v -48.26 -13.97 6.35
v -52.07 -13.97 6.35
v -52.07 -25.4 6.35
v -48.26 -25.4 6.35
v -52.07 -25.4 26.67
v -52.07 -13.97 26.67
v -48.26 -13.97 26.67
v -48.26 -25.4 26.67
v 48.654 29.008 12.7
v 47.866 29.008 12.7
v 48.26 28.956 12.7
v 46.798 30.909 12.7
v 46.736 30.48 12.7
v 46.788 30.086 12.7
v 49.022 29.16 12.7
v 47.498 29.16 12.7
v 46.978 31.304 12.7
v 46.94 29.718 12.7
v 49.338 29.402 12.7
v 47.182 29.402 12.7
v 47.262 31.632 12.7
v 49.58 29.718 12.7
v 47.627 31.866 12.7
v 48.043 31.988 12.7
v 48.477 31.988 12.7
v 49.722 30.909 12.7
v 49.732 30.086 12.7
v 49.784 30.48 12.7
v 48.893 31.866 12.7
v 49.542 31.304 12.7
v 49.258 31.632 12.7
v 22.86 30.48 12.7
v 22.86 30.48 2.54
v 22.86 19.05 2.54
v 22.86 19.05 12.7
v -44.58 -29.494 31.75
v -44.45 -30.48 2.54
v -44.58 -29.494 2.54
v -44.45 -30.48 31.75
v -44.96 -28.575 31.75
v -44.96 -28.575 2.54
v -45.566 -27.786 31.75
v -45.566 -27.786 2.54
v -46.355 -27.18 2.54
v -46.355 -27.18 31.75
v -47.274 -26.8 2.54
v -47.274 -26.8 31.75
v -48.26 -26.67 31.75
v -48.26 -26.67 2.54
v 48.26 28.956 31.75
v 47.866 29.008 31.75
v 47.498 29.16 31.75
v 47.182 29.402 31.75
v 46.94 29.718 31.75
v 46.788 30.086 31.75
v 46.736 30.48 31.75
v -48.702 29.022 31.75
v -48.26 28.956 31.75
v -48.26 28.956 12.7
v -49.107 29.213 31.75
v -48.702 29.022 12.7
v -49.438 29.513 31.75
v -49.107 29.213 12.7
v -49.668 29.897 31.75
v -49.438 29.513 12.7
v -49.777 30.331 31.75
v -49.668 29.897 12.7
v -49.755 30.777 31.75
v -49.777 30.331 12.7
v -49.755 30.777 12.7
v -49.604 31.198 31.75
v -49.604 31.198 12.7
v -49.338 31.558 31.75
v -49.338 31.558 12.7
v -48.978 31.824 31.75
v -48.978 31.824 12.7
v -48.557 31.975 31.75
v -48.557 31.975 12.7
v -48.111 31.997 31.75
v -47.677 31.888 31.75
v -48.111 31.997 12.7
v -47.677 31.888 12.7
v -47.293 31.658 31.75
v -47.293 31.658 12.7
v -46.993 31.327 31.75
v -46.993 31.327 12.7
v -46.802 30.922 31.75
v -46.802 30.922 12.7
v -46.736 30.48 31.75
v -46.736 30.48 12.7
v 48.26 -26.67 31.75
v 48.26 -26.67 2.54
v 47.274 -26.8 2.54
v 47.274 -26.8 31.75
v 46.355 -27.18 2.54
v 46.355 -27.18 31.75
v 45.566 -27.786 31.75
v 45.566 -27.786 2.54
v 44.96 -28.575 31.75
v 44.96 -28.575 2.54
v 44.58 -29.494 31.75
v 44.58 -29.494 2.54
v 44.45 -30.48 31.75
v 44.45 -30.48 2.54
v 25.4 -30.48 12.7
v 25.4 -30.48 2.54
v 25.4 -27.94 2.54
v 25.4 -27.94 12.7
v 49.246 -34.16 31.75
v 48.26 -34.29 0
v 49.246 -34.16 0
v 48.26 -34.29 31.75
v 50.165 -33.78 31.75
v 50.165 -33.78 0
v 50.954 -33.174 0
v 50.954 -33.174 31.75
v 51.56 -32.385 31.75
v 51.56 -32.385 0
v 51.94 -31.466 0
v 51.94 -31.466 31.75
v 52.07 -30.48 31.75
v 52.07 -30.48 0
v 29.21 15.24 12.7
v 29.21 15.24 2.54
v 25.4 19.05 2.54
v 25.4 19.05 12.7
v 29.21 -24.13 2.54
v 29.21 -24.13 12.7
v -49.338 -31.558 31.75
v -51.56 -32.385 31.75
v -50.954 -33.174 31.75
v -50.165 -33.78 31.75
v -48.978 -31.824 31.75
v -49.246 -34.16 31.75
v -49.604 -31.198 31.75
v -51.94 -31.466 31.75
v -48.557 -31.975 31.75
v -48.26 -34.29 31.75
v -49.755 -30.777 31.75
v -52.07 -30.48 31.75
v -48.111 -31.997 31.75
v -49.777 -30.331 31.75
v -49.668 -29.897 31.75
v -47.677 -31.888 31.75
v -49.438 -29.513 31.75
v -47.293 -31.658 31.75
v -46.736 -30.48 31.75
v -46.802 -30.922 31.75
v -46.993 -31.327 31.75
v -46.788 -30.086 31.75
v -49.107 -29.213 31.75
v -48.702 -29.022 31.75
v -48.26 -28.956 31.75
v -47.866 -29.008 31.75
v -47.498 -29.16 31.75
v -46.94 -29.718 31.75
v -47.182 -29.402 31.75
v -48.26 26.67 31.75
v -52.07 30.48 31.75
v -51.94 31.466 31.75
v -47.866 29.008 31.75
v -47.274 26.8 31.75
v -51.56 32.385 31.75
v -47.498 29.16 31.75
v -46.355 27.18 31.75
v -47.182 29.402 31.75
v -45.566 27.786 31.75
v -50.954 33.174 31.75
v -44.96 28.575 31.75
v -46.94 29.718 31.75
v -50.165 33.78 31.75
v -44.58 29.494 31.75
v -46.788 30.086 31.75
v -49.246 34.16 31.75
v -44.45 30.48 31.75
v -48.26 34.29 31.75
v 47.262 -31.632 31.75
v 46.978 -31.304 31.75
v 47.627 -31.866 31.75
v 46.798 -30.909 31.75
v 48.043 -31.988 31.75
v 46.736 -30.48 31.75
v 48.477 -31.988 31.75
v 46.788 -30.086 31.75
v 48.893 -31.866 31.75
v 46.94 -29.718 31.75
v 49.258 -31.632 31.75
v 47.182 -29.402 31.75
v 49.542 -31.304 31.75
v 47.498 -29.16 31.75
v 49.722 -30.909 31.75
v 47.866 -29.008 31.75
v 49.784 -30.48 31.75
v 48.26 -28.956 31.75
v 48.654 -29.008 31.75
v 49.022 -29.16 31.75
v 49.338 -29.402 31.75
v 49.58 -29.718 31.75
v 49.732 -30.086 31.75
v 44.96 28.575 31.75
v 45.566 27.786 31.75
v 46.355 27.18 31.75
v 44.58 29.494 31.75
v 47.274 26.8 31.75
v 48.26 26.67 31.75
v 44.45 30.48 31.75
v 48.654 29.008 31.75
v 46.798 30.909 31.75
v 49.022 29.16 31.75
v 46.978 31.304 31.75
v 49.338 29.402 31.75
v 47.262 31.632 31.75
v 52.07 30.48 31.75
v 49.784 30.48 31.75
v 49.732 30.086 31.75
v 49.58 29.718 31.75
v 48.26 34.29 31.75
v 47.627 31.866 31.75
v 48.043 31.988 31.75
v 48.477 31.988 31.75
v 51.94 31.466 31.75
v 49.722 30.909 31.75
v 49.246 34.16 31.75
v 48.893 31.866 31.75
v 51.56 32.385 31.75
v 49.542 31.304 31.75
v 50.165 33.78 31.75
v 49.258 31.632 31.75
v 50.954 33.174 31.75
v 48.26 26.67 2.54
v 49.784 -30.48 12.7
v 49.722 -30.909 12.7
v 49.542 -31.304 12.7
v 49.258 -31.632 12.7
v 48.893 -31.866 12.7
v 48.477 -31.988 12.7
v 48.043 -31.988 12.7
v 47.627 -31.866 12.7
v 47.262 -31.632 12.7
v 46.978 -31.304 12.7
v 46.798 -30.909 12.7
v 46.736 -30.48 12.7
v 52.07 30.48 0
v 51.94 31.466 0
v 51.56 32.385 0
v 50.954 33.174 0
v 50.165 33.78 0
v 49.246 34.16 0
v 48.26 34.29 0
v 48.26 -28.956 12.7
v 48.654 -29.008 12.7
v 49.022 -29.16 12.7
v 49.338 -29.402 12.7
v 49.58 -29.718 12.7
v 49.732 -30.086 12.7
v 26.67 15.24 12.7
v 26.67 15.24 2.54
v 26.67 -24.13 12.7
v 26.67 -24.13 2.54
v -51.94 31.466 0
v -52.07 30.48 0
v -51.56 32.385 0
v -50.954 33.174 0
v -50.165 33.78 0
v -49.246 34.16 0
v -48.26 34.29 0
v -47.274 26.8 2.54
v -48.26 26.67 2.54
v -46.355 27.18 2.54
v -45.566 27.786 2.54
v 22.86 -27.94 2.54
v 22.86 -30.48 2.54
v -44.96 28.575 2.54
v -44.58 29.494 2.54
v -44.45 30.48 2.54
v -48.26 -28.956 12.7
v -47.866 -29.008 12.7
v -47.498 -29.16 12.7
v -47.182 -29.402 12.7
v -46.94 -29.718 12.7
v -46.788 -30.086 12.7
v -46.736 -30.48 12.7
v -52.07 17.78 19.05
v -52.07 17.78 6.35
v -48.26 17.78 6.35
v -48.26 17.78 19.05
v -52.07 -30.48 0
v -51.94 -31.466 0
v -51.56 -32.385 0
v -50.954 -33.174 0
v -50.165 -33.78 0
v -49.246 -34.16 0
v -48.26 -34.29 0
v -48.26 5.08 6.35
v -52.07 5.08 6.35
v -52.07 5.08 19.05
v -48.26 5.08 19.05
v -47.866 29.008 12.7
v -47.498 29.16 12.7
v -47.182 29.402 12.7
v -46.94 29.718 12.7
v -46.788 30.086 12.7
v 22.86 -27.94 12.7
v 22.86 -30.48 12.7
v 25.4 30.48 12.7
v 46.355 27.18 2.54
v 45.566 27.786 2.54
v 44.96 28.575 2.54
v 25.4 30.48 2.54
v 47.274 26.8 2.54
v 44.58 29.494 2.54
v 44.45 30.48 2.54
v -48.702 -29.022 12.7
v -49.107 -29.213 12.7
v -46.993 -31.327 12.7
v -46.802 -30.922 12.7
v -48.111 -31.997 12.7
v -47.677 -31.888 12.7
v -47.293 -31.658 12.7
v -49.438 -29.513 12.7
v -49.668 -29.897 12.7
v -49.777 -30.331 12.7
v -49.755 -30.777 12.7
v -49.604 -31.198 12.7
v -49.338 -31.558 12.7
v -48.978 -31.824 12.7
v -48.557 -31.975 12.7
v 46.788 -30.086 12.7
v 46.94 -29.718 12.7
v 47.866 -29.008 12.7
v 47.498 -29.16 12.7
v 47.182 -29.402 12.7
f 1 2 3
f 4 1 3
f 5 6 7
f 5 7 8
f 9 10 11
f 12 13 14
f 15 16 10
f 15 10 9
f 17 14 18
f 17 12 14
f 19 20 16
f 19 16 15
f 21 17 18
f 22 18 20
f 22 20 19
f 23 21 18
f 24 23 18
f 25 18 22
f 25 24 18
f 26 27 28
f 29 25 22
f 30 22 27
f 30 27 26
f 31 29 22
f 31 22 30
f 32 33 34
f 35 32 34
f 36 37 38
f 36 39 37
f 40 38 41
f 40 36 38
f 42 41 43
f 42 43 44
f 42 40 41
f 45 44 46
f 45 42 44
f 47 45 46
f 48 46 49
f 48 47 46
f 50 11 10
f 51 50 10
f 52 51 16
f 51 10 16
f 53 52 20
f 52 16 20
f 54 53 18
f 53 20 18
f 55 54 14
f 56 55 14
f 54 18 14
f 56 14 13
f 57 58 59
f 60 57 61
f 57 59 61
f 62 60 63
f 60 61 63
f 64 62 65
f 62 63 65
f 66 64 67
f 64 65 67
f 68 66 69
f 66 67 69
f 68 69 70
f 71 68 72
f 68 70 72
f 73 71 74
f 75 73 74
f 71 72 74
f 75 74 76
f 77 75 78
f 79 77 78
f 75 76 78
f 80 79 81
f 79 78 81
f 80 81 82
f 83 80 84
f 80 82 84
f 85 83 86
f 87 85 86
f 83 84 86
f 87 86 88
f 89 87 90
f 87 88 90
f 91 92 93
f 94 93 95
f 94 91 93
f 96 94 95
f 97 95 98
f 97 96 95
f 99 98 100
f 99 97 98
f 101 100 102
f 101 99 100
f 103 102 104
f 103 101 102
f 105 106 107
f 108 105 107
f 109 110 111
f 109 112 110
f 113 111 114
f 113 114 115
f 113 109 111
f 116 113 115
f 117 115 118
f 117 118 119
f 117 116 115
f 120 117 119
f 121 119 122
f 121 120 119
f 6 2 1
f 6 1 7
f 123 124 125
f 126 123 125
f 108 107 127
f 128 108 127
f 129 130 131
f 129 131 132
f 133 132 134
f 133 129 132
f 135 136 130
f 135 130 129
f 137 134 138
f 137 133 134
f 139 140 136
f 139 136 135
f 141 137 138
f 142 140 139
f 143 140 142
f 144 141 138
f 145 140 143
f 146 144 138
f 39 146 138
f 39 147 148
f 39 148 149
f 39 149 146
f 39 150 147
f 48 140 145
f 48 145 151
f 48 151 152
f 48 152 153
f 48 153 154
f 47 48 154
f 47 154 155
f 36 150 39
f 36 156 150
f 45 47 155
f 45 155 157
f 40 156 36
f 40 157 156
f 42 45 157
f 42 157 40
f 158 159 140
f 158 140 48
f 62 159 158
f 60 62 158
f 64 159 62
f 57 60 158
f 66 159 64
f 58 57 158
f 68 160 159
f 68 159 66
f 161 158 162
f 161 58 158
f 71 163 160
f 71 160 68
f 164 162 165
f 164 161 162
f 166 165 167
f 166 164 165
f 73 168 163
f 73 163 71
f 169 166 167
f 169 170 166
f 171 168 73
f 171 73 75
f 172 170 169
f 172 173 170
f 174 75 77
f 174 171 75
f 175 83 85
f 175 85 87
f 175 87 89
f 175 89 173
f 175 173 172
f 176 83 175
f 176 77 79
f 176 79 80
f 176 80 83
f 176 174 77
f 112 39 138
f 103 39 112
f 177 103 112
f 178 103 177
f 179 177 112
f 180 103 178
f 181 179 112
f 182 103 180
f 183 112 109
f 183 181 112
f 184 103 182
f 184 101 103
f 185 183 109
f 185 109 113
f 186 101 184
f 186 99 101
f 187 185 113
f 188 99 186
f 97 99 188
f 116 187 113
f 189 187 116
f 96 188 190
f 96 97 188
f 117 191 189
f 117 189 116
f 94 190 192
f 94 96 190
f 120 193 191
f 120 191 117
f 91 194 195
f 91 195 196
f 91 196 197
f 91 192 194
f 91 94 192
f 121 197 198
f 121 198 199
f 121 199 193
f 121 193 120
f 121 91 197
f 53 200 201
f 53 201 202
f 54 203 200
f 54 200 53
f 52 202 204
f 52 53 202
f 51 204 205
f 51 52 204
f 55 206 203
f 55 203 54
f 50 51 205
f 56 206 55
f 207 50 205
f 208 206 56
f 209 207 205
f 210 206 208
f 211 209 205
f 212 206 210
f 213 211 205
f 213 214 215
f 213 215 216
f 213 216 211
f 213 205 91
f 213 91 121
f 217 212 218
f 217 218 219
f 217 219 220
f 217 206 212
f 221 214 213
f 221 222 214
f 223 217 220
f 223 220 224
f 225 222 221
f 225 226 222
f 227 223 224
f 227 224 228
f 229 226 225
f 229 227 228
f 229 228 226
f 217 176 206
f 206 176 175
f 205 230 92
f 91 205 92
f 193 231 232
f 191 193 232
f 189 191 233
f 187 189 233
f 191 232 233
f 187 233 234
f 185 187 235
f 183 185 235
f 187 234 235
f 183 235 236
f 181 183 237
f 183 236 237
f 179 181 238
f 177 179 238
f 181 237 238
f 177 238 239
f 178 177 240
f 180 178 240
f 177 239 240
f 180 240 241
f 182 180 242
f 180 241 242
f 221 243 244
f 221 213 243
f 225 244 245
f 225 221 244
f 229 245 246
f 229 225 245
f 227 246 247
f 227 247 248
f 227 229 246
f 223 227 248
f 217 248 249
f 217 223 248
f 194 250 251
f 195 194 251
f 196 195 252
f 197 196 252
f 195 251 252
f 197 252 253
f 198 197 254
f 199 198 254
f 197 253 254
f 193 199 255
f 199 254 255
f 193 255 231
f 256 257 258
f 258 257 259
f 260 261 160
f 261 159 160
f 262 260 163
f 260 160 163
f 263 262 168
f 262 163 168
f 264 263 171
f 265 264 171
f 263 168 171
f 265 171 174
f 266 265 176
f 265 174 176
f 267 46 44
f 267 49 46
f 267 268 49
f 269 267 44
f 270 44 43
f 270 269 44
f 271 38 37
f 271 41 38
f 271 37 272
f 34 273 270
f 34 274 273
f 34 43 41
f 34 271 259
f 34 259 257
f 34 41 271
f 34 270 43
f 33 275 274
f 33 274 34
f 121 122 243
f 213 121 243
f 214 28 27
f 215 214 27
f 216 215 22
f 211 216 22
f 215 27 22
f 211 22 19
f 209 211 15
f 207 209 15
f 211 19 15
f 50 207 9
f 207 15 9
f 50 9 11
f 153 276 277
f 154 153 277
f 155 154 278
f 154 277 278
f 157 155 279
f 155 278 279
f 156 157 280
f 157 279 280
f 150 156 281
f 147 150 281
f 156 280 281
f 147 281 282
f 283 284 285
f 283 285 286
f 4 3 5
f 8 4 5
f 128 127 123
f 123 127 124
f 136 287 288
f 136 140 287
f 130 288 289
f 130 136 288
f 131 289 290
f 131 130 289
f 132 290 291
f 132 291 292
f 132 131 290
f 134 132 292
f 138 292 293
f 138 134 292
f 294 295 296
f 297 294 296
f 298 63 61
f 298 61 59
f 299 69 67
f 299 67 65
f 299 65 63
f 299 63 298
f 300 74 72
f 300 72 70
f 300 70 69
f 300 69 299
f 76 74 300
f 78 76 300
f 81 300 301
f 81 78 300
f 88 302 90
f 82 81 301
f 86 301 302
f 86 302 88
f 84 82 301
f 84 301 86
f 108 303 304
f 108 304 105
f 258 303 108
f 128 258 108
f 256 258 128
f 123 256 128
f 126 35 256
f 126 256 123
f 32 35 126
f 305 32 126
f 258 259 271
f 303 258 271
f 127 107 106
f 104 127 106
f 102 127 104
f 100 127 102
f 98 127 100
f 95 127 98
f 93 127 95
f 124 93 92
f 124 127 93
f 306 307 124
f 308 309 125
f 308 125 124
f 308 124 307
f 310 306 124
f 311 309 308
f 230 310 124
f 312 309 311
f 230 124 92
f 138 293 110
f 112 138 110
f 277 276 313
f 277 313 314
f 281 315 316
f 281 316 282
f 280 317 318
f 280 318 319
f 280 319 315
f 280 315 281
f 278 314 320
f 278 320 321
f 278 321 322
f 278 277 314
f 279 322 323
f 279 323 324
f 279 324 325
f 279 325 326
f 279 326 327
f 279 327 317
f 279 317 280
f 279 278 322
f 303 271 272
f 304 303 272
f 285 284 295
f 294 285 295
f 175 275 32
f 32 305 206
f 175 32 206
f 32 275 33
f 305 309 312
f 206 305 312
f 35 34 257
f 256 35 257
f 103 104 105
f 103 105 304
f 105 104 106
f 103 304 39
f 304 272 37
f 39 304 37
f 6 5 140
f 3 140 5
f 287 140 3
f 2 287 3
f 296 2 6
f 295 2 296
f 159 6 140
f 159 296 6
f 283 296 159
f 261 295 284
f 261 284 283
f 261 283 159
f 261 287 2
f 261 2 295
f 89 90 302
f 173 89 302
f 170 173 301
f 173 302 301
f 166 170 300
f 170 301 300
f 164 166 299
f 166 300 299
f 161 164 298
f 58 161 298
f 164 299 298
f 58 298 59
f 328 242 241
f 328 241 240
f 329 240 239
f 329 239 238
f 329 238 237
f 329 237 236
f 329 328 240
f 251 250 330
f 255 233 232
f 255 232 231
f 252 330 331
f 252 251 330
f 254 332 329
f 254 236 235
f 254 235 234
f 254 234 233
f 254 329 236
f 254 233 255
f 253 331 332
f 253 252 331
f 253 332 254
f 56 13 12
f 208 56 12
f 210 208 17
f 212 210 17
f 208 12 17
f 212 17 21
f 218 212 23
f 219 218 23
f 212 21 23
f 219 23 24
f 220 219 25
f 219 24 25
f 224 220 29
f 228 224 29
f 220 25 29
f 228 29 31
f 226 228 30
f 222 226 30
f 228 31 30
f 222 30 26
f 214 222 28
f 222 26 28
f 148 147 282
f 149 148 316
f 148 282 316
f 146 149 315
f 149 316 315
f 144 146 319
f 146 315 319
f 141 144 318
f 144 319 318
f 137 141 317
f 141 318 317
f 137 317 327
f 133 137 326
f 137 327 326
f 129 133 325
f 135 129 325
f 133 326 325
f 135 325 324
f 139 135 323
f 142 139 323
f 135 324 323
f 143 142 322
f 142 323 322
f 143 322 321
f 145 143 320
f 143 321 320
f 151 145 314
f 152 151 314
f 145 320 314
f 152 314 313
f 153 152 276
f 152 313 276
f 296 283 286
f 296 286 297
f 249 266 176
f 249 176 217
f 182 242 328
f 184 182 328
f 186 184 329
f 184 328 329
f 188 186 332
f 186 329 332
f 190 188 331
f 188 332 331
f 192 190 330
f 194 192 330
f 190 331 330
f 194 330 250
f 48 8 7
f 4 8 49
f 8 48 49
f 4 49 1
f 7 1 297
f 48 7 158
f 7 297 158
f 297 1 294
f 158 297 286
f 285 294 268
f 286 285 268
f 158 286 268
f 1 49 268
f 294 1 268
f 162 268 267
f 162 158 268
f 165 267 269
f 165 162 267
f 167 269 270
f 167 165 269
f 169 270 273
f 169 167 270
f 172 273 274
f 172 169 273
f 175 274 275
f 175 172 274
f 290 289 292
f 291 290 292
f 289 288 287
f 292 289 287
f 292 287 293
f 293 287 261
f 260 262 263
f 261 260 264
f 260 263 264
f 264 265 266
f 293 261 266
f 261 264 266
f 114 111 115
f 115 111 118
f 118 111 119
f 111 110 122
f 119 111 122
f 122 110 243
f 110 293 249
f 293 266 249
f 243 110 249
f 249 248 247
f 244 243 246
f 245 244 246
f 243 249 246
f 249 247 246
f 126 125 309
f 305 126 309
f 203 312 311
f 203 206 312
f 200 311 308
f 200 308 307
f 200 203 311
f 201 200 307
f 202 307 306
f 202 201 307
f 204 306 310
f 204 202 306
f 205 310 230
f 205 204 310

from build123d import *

# Parameters (mm, degrees)
F0_W     = 104.14
F0_H     = 68.58
F1_DEPTH = 31.75
F2_DEPTH = 12.7
F3_DEPTH = 2.54
F4_W     = 12.7
F4_H     = 12.7
F4_W_2   = 11.43
F4_H_2   = 20.32
F5_DEPTH = 10.16
F6_R     = 3.81
F7_R     = 3.80999
F8_DEPTH = 12.7


# Not quite as in the source:
# - a fillet or chamfer is up to 0.001 mm smaller than in the source, because OpenCascade refuses the exact size


with BuildPart() as f1:
    # F0 (on Top) → F1 (new body)
    with BuildSketch(Plane.XY):
        Rectangle(F0_W, F0_H)
        with BuildLine():
            ThreePointArc((-48.26, 28.956), (-49.3376307345, 31.5576307345), (-46.736, 30.48))
            Line((-46.736, 30.48), (-44.45, 30.48))
            Line((-44.45, 30.48), (22.86, 30.48))
            Line((22.86, 30.48), (25.4, 30.48))
            Line((25.4, 30.48), (44.45, 30.48))
            Line((44.45, 30.48), (46.736, 30.48))
            ThreePointArc((46.736, 30.48), (48.26, 32.004), (49.784, 30.48))
            ThreePointArc((49.784, 30.48), (49.3376307345, 29.4023692655), (48.26, 28.956))
            Line((48.26, 28.956), (48.26, 26.67))
            Line((48.26, 26.67), (48.26, -26.67))
            Line((48.26, -26.67), (48.26, -28.956))
            ThreePointArc((48.26, -28.956), (49.3376307345, -29.4023692655), (49.784, -30.48))
            ThreePointArc((49.784, -30.48), (48.26, -32.004), (46.736, -30.48))
            Line((46.736, -30.48), (44.45, -30.48))
            Line((44.45, -30.48), (25.4, -30.48))
            Line((25.4, -30.48), (22.86, -30.48))
            Line((22.86, -30.48), (-44.45, -30.48))
            Line((-44.45, -30.48), (-46.736, -30.48))
            ThreePointArc((-46.736, -30.48), (-49.3376307345, -31.5576307345), (-48.26, -28.956))
            Line((-48.26, -28.956), (-48.26, -26.67))
            Line((-48.26, -26.67), (-48.26, 26.67))
            Line((-48.26, 26.67), (-48.26, 28.956))
        make_face(mode=Mode.SUBTRACT)
        with BuildLine():
            Line((46.736, 30.48), (44.45, 30.48))
            Line((44.45, 30.48), (44.45, 26.67))
            Line((44.45, 26.67), (48.26, 26.67))
            Line((48.26, 26.67), (48.26, 28.956))
            ThreePointArc((48.26, 28.956), (47.1823692655, 29.4023692655), (46.736, 30.48))
        make_face()
        with BuildLine():
            Line((48.26, -28.956), (48.26, -26.67))
            Line((48.26, -26.67), (44.45, -26.67))
            Line((44.45, -26.67), (44.45, -30.48))
            Line((44.45, -30.48), (46.736, -30.48))
            ThreePointArc((46.736, -30.48), (47.1823692655, -29.4023692655), (48.26, -28.956))
        make_face()
        with BuildLine():
            Line((-44.45, -26.67), (-48.26, -26.67))
            Line((-48.26, -26.67), (-48.26, -28.956))
            ThreePointArc((-48.26, -28.956), (-47.1823692655, -29.4023692655), (-46.736, -30.48))
            Line((-46.736, -30.48), (-44.45, -30.48))
            Line((-44.45, -30.48), (-44.45, -26.67))
        make_face()
        with BuildLine():
            Line((-44.45, 30.48), (-46.736, 30.48))
            ThreePointArc((-46.736, 30.48), (-47.1823692655, 29.4023692655), (-48.26, 28.956))
            Line((-48.26, 28.956), (-48.26, 26.67))
            Line((-48.26, 26.67), (-44.45, 26.67))
            Line((-44.45, 26.67), (-44.45, 30.48))
        make_face()
    extrude(amount=F1_DEPTH)

    # F0 (on Top) → F2 (join)
    with BuildSketch(Plane.XY):
        Polygon((25.4, 30.48), (22.86, 30.48), (22.86, 19.05), (26.67, 15.24), (26.67, -24.13), (22.86, -27.94), (22.86, -30.48), (25.4, -30.48), (25.4, -27.94), (29.21, -24.13), (29.21, 15.24), (25.4, 19.05), align=None)
    extrude(amount=F2_DEPTH)

    # F0 (on Top) → F3 (join)
    with BuildSketch(Plane.XY):
        Polygon((22.86, 30.48), (-44.45, 30.48), (-44.45, 26.67), (-48.26, 26.67), (-48.26, -26.67), (-44.45, -26.67), (-44.45, -30.48), (22.86, -30.48), (22.86, -27.94), (26.67, -24.13), (26.67, 15.24), (22.86, 19.05), align=None)
        Polygon((44.45, 30.48), (25.4, 30.48), (25.4, 19.05), (29.21, 15.24), (29.21, -24.13), (25.4, -27.94), (25.4, -30.48), (44.45, -30.48), (44.45, -26.67), (48.26, -26.67), (48.26, 26.67), (44.45, 26.67), align=None)
    extrude(amount=F3_DEPTH)

    # F4 (on face) → F5 (cut)
    with BuildSketch(Plane(origin=(-52.07, 0, 0), x_dir=(0, -1, 0), z_dir=(-1, 0, 0))):
        with Locations((-11.43, 12.7)):
            Rectangle(F4_W, F4_H)
        with Locations((19.685, 16.51)):
            Rectangle(F4_W_2, F4_H_2)
    extrude(amount=-F5_DEPTH, mode=Mode.SUBTRACT)

    # F6
    f6_edges = [f1.edges().sort_by_distance(p)[0] for p in [
        (-52.07, -34.29, 15.875),
        (52.07, -34.29, 15.875),
        (52.07, 34.29, 15.875),
        (-52.07, 34.29, 15.875),
    ]]
    fillet(f6_edges, radius=F6_R)

    # F7 (radius 3.81 in the source; OpenCascade refuses exactly that, so slightly less here)
    f7_edges = [f1.edges().sort_by_distance(p)[0] for p in [
        (44.45, 26.67, 17.145),
        (-44.45, 26.67, 17.145),
        (44.45, -26.67, 17.145),
        (-44.45, -26.67, 17.145),
    ]]
    fillet(f7_edges, radius=F7_R)

    # F0 (on Top) → F8 (join)
    with BuildSketch(Plane.XY):
        with BuildLine():
            Line((-48.26, 28.956), (-48.26, 30.48))
            Line((-48.26, 30.48), (-46.736, 30.48))
            ThreePointArc((-46.736, 30.48), (-49.3376307345, 31.5576307345), (-48.26, 28.956))
        make_face()
        with BuildLine():
            Line((48.26, 30.48), (46.736, 30.48))
            ThreePointArc((46.736, 30.48), (47.1823692655, 29.4023692655), (48.26, 28.956))
            Line((48.26, 28.956), (48.26, 30.48))
        make_face()
        with BuildLine():
            ThreePointArc((49.784, 30.48), (48.26, 32.004), (46.736, 30.48))
            Line((46.736, 30.48), (48.26, 30.48))
            Line((48.26, 30.48), (48.26, 28.956))
            ThreePointArc((48.26, 28.956), (49.3376307345, 29.4023692655), (49.784, 30.48))
        make_face()
        with BuildLine():
            Line((-46.736, 30.48), (-48.26, 30.48))
            Line((-48.26, 30.48), (-48.26, 28.956))
            ThreePointArc((-48.26, 28.956), (-47.1823692655, 29.4023692655), (-46.736, 30.48))
        make_face()
        with BuildLine():
            Line((-48.26, -30.48), (-48.26, -28.956))
            ThreePointArc((-48.26, -28.956), (-49.3376307345, -31.5576307345), (-46.736, -30.48))
            Line((-46.736, -30.48), (-48.26, -30.48))
        make_face()
        with BuildLine():
            ThreePointArc((-46.736, -30.48), (-47.1823692655, -29.4023692655), (-48.26, -28.956))
            Line((-48.26, -28.956), (-48.26, -30.48))
            Line((-48.26, -30.48), (-46.736, -30.48))
        make_face()
        with BuildLine():
            ThreePointArc((49.784, -30.48), (49.3376307345, -29.4023692655), (48.26, -28.956))
            Line((48.26, -28.956), (48.26, -30.48))
            Line((48.26, -30.48), (46.736, -30.48))
            ThreePointArc((46.736, -30.48), (48.26, -32.004), (49.784, -30.48))
        make_face()
        with BuildLine():
            Line((48.26, -30.48), (48.26, -28.956))
            ThreePointArc((48.26, -28.956), (47.1823692655, -29.4023692655), (46.736, -30.48))
            Line((46.736, -30.48), (48.26, -30.48))
        make_face()
    extrude(amount=F8_DEPTH)


solid = f1.part
